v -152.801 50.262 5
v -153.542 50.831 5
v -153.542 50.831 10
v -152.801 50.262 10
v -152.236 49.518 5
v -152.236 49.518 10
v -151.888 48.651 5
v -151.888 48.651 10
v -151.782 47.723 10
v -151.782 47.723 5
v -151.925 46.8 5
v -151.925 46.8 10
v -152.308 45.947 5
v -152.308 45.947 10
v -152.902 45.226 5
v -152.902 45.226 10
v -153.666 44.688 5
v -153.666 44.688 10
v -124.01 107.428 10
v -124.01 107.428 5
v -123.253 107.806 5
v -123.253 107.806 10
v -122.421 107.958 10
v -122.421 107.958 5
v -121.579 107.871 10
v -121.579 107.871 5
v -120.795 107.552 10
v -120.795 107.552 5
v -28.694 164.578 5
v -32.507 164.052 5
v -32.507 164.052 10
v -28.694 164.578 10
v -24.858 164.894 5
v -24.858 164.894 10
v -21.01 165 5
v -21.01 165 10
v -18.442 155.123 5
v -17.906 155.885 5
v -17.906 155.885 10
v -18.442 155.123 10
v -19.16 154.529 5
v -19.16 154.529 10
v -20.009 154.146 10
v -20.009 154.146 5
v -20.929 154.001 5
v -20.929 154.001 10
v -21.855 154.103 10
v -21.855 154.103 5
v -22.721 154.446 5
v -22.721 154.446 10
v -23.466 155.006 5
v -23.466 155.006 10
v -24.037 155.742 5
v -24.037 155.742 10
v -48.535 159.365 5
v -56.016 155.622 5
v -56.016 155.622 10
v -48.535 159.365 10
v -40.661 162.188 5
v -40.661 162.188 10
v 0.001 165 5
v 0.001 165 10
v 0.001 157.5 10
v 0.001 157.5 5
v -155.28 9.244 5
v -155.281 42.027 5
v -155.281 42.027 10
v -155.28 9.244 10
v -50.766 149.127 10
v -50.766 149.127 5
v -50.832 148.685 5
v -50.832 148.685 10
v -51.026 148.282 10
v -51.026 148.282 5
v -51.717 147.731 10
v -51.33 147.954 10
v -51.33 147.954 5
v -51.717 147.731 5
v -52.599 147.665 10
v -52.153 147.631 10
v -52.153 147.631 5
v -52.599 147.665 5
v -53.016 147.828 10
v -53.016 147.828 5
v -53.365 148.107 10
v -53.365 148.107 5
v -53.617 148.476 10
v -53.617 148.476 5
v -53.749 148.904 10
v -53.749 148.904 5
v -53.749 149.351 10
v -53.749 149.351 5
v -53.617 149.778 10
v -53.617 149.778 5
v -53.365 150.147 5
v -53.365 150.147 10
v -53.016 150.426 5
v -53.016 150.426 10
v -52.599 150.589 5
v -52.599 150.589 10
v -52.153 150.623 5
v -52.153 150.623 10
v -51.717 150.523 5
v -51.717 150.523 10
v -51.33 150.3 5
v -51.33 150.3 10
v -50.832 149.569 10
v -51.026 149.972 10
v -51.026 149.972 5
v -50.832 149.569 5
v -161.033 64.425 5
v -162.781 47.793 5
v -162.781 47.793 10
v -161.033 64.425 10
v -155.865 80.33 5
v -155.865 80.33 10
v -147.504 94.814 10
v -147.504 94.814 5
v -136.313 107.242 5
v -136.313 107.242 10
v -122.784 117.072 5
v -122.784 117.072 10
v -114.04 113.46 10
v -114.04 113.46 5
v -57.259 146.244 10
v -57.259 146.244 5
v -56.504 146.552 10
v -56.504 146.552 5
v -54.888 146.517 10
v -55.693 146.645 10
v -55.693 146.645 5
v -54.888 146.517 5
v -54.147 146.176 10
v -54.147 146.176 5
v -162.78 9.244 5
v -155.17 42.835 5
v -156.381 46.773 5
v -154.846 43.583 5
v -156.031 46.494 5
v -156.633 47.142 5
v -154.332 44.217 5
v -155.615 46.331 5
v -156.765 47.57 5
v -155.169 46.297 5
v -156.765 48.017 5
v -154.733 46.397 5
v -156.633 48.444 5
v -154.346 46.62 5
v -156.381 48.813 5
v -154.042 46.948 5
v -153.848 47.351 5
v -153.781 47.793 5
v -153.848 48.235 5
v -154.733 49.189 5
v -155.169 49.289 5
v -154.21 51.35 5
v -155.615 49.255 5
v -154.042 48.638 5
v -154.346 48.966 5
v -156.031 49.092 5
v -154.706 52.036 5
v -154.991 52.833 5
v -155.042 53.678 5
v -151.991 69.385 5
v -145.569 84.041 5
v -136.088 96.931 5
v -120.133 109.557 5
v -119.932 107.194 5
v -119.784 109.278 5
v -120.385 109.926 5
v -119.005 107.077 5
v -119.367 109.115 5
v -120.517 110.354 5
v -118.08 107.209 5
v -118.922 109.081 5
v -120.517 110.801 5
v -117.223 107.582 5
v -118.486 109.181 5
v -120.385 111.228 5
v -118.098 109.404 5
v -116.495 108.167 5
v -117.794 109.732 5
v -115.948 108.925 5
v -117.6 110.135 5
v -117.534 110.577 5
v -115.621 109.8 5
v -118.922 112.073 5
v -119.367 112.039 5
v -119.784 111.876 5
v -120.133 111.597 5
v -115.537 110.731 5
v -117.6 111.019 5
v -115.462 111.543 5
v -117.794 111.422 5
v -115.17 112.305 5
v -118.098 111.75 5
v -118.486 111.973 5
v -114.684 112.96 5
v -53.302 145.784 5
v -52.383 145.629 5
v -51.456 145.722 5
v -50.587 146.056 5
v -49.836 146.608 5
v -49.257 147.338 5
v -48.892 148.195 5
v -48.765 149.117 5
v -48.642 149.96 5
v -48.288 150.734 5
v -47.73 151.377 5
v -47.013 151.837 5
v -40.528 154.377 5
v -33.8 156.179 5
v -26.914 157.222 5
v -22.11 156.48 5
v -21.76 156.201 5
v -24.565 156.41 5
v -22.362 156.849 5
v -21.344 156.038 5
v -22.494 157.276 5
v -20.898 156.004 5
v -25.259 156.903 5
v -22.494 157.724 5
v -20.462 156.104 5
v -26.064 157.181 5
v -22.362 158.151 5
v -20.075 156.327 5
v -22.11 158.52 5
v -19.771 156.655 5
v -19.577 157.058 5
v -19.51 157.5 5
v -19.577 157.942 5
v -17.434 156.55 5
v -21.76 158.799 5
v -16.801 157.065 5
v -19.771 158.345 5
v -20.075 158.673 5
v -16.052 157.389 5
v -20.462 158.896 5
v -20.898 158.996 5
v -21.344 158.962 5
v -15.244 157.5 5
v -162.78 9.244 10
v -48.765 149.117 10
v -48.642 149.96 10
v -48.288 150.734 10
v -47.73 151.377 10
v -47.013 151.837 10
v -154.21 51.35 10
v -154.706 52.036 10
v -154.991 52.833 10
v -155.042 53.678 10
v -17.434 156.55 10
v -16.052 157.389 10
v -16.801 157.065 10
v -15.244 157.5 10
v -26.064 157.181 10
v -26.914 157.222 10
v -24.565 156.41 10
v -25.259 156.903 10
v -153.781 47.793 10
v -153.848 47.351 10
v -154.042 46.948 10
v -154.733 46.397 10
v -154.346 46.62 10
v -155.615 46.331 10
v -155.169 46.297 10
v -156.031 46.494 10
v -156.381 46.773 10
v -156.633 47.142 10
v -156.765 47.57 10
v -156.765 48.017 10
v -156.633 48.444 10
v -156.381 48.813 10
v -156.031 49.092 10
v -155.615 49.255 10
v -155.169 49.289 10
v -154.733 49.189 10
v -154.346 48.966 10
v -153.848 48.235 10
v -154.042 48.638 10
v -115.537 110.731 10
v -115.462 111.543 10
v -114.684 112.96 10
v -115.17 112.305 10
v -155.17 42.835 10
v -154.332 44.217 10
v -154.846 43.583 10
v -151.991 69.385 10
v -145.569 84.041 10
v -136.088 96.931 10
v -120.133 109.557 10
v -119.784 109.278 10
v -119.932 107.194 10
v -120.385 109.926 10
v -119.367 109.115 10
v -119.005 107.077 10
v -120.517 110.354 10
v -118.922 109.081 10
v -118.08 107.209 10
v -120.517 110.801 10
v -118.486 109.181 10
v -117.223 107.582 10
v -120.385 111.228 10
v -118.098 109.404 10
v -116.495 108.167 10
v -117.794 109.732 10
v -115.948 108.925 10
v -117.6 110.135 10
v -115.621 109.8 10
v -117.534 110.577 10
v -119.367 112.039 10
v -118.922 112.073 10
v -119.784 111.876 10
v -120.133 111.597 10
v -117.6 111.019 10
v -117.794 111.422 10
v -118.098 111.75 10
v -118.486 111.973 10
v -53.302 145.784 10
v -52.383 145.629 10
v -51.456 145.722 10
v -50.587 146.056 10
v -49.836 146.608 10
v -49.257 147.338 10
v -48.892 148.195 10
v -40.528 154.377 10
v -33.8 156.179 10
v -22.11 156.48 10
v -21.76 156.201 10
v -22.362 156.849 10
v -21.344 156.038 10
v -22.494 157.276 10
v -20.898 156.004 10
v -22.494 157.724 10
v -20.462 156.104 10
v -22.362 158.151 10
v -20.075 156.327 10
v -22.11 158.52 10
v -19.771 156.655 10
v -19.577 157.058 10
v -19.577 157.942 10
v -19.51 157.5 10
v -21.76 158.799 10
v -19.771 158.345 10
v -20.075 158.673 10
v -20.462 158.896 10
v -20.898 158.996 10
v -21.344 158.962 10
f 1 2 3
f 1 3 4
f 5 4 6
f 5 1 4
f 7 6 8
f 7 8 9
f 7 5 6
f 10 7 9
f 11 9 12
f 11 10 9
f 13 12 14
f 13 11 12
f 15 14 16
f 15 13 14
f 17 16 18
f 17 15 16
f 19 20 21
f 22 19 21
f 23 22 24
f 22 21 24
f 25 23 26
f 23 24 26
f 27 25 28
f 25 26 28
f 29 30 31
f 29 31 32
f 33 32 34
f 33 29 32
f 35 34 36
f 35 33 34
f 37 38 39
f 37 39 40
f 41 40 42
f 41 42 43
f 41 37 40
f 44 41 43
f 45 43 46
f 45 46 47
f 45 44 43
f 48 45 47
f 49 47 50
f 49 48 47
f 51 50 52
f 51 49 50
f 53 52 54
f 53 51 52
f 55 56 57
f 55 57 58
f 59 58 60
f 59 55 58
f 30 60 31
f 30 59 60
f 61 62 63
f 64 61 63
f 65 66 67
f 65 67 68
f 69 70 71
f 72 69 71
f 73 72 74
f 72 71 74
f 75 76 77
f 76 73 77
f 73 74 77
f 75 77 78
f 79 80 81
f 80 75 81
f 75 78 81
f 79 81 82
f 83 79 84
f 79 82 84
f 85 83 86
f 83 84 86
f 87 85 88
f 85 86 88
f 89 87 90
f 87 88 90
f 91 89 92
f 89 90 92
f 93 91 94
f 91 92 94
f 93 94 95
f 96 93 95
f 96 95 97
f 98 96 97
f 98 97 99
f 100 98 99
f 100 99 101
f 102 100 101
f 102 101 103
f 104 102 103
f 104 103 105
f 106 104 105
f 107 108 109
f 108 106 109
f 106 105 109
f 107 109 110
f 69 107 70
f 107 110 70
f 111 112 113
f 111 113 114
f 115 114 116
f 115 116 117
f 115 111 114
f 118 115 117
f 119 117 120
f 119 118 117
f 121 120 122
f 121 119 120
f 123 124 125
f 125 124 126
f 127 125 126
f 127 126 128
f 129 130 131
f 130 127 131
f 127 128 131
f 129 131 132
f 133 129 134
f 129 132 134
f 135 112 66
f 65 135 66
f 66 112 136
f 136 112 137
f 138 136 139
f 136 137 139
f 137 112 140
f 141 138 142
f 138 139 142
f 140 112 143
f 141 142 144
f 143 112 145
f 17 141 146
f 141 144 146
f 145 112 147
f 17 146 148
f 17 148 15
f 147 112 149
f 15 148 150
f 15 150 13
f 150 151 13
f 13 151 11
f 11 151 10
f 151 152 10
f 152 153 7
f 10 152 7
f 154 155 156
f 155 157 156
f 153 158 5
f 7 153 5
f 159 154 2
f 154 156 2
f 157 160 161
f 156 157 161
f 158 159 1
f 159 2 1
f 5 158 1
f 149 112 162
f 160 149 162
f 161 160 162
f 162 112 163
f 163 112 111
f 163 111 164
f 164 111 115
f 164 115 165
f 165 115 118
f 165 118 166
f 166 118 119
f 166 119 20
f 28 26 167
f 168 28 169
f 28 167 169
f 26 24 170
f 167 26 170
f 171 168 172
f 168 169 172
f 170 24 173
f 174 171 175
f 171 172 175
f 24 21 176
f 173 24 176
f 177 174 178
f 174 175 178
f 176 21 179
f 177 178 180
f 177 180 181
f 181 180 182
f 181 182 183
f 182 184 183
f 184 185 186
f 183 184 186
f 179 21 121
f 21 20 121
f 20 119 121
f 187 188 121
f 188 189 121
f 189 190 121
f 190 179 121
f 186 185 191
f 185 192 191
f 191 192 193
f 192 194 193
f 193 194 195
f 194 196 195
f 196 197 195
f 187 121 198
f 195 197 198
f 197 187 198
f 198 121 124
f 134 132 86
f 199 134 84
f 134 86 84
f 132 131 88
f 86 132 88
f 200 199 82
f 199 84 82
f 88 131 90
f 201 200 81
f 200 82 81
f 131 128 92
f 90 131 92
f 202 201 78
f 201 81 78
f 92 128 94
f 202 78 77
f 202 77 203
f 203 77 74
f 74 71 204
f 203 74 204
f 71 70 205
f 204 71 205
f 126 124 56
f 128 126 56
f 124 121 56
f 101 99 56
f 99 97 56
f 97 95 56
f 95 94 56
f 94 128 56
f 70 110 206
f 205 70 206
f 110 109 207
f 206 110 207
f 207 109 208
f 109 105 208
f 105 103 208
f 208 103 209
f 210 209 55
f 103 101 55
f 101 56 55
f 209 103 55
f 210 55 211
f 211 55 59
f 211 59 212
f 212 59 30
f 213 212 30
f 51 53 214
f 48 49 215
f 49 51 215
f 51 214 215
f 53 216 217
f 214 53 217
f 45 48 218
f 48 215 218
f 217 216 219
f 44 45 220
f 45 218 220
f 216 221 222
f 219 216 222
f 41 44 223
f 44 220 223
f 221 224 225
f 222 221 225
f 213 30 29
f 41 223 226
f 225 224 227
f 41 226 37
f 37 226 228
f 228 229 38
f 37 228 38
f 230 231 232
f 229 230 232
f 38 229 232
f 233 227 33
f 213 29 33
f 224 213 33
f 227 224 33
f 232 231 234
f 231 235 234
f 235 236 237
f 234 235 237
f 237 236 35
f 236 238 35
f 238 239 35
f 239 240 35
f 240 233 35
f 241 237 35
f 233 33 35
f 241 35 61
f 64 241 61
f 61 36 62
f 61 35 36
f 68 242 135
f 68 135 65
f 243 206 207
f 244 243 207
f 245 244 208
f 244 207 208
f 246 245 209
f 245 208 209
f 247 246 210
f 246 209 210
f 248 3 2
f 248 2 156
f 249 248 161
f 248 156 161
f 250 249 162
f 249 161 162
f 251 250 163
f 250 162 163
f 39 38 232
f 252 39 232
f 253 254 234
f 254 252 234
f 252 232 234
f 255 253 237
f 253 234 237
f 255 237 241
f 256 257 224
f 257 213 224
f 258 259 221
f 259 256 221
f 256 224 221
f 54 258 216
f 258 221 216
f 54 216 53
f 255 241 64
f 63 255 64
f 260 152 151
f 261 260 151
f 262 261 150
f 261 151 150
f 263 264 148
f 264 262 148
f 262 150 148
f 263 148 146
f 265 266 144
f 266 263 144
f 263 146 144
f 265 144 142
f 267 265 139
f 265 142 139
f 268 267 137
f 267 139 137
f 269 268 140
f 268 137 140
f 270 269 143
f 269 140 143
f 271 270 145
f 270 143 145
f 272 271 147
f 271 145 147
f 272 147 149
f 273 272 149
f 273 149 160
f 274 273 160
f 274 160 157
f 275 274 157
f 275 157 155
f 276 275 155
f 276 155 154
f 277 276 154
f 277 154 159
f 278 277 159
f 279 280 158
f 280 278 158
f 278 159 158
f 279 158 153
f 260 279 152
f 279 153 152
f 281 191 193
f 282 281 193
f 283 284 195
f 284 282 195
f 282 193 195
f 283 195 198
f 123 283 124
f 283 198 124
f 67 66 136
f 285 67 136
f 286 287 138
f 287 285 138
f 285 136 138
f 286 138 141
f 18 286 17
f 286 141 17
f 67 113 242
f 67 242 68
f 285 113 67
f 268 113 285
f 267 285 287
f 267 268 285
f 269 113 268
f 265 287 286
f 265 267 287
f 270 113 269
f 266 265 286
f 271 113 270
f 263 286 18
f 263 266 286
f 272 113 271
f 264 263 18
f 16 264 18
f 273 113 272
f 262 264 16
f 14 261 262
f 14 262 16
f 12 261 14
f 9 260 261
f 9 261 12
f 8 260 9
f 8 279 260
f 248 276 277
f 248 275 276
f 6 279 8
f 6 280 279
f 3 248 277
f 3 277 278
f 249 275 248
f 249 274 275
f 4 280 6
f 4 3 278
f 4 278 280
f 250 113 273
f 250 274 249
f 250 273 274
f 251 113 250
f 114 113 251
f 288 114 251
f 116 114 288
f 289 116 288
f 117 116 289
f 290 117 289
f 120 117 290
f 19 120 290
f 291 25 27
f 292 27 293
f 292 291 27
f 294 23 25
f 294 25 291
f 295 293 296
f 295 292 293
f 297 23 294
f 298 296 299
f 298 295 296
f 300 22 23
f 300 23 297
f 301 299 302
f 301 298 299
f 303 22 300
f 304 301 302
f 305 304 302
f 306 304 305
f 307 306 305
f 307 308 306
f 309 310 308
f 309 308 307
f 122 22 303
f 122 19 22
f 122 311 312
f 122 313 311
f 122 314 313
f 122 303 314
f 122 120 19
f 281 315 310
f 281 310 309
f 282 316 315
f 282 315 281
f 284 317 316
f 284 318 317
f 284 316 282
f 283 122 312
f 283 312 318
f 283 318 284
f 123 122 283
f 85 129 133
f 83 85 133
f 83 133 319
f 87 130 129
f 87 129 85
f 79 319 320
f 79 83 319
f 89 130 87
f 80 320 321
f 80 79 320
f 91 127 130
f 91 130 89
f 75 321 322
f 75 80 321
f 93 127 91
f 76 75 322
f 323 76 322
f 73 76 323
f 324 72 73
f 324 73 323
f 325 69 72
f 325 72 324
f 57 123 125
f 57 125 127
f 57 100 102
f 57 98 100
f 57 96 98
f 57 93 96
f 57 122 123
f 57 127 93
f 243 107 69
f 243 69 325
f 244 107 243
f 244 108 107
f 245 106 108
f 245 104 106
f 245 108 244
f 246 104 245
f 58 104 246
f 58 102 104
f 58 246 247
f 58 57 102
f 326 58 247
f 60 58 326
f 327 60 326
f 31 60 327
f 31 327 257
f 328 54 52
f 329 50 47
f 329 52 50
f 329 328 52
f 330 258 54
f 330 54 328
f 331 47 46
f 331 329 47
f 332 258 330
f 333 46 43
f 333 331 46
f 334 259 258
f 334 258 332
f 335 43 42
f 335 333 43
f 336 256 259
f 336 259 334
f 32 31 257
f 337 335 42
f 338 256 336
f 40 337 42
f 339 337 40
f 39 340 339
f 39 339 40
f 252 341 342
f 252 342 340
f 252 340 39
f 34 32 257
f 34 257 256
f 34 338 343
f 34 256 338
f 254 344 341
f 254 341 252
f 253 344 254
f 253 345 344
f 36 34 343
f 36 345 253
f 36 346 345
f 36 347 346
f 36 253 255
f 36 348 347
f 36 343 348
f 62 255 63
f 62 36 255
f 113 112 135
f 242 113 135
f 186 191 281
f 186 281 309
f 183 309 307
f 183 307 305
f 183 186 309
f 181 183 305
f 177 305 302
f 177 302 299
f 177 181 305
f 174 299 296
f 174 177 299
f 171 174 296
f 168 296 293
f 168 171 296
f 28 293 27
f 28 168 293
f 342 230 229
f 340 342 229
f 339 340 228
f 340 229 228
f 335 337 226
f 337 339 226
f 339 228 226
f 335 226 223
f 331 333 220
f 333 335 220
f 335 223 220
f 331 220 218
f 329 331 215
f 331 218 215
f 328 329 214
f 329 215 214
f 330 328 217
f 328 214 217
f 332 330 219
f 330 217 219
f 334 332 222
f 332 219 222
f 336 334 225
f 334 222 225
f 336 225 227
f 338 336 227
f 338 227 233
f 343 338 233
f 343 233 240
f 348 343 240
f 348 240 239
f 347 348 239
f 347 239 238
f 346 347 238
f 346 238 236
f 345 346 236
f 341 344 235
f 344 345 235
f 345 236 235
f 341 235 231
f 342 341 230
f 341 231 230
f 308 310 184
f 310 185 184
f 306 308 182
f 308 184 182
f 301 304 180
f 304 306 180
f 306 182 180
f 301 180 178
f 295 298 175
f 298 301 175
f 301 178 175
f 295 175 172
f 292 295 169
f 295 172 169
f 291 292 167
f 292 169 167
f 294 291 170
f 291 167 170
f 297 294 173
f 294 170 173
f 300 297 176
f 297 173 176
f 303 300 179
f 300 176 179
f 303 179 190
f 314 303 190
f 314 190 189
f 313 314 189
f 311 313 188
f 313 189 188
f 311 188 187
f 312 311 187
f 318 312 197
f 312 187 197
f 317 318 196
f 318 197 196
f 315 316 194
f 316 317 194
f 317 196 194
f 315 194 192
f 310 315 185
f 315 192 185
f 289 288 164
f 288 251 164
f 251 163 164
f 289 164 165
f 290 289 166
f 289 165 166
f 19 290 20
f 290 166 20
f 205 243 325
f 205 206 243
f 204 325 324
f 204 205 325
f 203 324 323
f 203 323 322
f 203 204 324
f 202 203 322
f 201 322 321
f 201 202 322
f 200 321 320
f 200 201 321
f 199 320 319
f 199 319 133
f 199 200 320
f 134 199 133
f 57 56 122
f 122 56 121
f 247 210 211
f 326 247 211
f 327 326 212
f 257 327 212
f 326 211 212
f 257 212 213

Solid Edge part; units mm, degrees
sketch "Sketch1" plane through (0.0007, 14.651, 5) normal (0, 0, 1) x (1, 0, 0)
  line L0 (-114.0407, 98.8093) -> (-57.2599, 131.5929)
  arc A0 (-54.1474, 131.5247) -> (-57.2599, 131.5929) centre (-55.7598, 128.9948) ccw
  arc A1 (-47.0142, 137.1861) -> (-48.7662, 134.4664) centre (-45.7662, 134.458) ccw
  arc A2 (-47.0142, 137.1861) -> (-26.9146, 142.5706) centre (-21.0226, 80.3698) cw
  arc A3 (-24.0376, 141.0909) -> (-26.9146, 142.5706) centre (-26.6317, 139.5839) ccw
  arc A4 (-15.245, 142.849) -> (-17.9063, 141.2336) centre (-15.245, 139.849) ccw
  line L1 (-15.245, 142.849) -> (15.2436, 142.849)
  arc A5 (17.905, 141.2336) -> (15.2436, 142.849) centre (15.2436, 139.849) ccw
  arc A6 (26.9132, 142.5696) -> (24.036, 141.0904) centre (26.6298, 139.583) ccw
  arc A7 (26.9132, 142.5696) -> (47.0027, 137.1869) centre (21.0099, 80.3561) cw
  arc A8 (48.7549, 134.4673) -> (47.0027, 137.1869) centre (45.7549, 134.4587) ccw
  arc A9 (57.2487, 131.5943) -> (54.1362, 131.526) centre (55.7487, 128.9962) ccw
  line L2 (57.2487, 131.5943) -> (114.0299, 98.8129)
  arc A10 (115.5271, 96.0833) -> (114.0299, 98.8129) centre (112.5299, 96.2148) ccw
  arc A11 (124.0003, 92.7805) -> (120.7849, 92.9052) centre (122.2944, 90.3127) ccw
  arc A12 (124.0003, 92.7805) -> (155.0355, 39.027) centre (82.7747, 33.1424) cw
  arc A13 (153.5358, 36.1799) -> (155.0355, 39.027) centre (152.0454, 38.7835) ccw
  arc A14 (155.2747, 27.3761) -> (153.6593, 30.0375) centre (152.2747, 27.3761) ccw
  line L3 (155.2747, 27.3761) -> (155.2747, -38.192)
  arc A15 (153.6593, -40.8534) -> (155.2747, -38.192) centre (152.2747, -38.192) ccw
  arc A16 (154.9954, -49.8615) -> (153.5161, -46.9844) centre (152.0088, -49.5782) ccw
  arc A17 (154.9954, -49.8615) -> (149.6134, -69.9554) centre (92.7533, -43.9583) cw
  arc A18 (146.8942, -71.7079) -> (149.6134, -69.9554) centre (146.8851, -68.7079) ccw
  arc A19 (144.0217, -80.2016) -> (143.9534, -77.0892) centre (141.4236, -78.7016) ccw
  line L4 (144.0217, -80.2016) -> (127.6444, -108.5679)
  arc A20 (122.7007, -116.5716) -> (122.8583, -113.3403) centre (120.256, -114.8329) ccw
  arc A21 (77.6703, -142.5696) -> (122.7007, -116.5716) centre (71.767, -80.3476) ccw
  arc A22 (74.7931, -141.0904) -> (77.6703, -142.5696) centre (77.3869, -139.583) ccw
  arc A23 (66.0007, -142.849) -> (68.6621, -141.2336) centre (66.0007, -139.849) ccw
  line L5 (5.7656, -142.849) -> (66.0007, -142.849)
  arc A24 (3.1042, -141.2336) -> (5.7656, -142.849) centre (5.7656, -139.849) ccw
  arc A25 (-5.767, -142.849) -> (-3.1056, -141.2336) centre (-5.767, -139.849) ccw
  line L6 (-66.0021, -142.849) -> (-5.767, -142.849)
  arc A26 (-68.6634, -141.2336) -> (-66.0021, -142.849) centre (-66.0021, -139.849) ccw
  arc A27 (-77.6716, -142.5694) -> (-74.7944, -141.0903) centre (-77.3881, -139.5828) ccw
  arc A28 (-122.6994, -116.5717) -> (-77.6716, -142.5694) centre (-71.7665, -80.349) ccw
  arc A29 (-122.857, -113.3404) -> (-122.6994, -116.5717) centre (-120.2547, -114.833) ccw
  arc A30 (-128.7762, -106.6053) -> (-126.0465, -108.1024) centre (-126.1781, -105.1053) ccw
  line L7 (-144.0218, -80.199) -> (-128.7762, -106.6053)
  arc A31 (-143.9535, -77.0865) -> (-144.0218, -80.199) centre (-141.4237, -78.699) ccw
  arc A32 (-149.6144, -69.9531) -> (-146.8949, -71.7053) centre (-146.8862, -68.7053) ccw
  arc A33 (-154.9987, -49.8585) -> (-149.6144, -69.9531) centre (-92.7672, -43.9523) ccw
  arc A34 (-153.5196, -46.9813) -> (-154.9987, -49.8585) centre (-152.0122, -49.5751) ccw
  arc A35 (-155.2786, -38.189) -> (-153.6631, -40.8503) centre (-152.2786, -38.1889) ccw
  line L8 (-155.2818, 27.3758) -> (-155.2786, -38.189)
  arc A36 (-153.6665, 30.0373) -> (-155.2818, 27.3758) centre (-152.2818, 27.376) ccw
  arc A37 (-155.0428, 39.0267) -> (-153.5432, 36.1796) centre (-152.0527, 38.7832) ccw
  arc A38 (-124.0109, 92.7765) -> (-155.0428, 39.0267) centre (-82.7847, 33.1421) ccw
  arc A39 (-120.7955, 92.9014) -> (-124.0109, 92.7765) centre (-122.3049, 90.3088) ccw
  arc A40 (-114.0407, 98.8093) -> (-115.5378, 96.0796) centre (-112.5406, 96.2112) ccw
  arc A41 (-48.7662, 134.4664) -> (-54.1474, 131.5247) centre (-52.2662, 134.4761) cw
  arc A42 (-17.9064, 141.2336) -> (-24.0377, 141.0909) centre (-21.0113, 142.849) cw
  arc A43 (24.036, 141.0904) -> (17.905, 141.2336) centre (21.0099, 142.849) cw
  arc A44 (54.1362, 131.526) -> (48.7549, 134.4673) centre (52.2549, 134.4774) cw
  arc A45 (120.7849, 92.9052) -> (115.5271, 96.0832) centre (119.0237, 95.9298) cw
  arc A46 (153.6593, 30.0375) -> (153.5358, 36.1799) centre (155.2747, 33.1424) cw
  arc A47 (153.5161, -46.9844) -> (153.6593, -40.8534) centre (155.2747, -43.9583) cw
  arc A48 (143.9534, -77.0891) -> (146.8942, -71.7079) centre (146.9048, -75.2079) cw
  arc A49 (122.8584, -113.3404) -> (127.6444, -108.5679) centre (125.8944, -111.599) cw
  arc A50 (68.6621, -141.2336) -> (74.7931, -141.0904) centre (71.767, -142.849) cw
  arc A51 (-3.1056, -141.2336) -> (3.1042, -141.2336) centre (-0.0007, -142.849) cw
  arc A52 (-74.7944, -141.0903) -> (-68.6635, -141.2336) centre (-71.7684, -142.849) cw
  arc A53 (-126.0466, -108.1024) -> (-122.857, -113.3404) centre (-125.8931, -111.599) cw
  arc A54 (-146.8949, -71.7053) -> (-143.9536, -77.0866) centre (-146.905, -75.2053) cw
  arc A55 (-153.6632, -40.8503) -> (-153.5196, -46.9813) centre (-155.2784, -43.9553) cw
  arc A56 (-153.5432, 36.1796) -> (-153.6665, 30.0373) centre (-155.2821, 33.1421) cw
  arc A57 (-115.5377, 96.0796) -> (-120.7955, 92.9014) centre (-119.0344, 95.926) cw
  line L9 (-56.0166, 140.971) -> (-122.7845, 102.4212)
  arc A58 (-162.7821, 33.1421) -> (-122.7845, 102.4212) centre (-82.7847, 33.1421) cw
  line L10 (-162.7821, 33.1421) -> (-162.7784, -43.9553)
  arc A59 (-162.7784, -43.9553) -> (-153.4002, -78.9553) centre (-92.7784, -43.9553) ccw
  line L11 (-132.3882, -115.349) -> (-153.4002, -78.9553)
  arc A60 (-132.3882, -115.349) -> (-71.7683, -150.349) centre (-71.7665, -80.349) ccw
  line L12 (71.767, -150.349) -> (-71.7683, -150.349)
  arc A61 (71.767, -150.349) -> (132.3896, -115.349) centre (71.7678, -80.349) ccw
  line L13 (132.3896, -115.349) -> (153.4002, -78.9576)
  arc A62 (162.7747, -43.9583) -> (153.4002, -78.9576) centre (92.791, -43.9684) cw
  line L14 (162.7747, 33.1424) -> (162.7747, -43.9583)
  arc A63 (122.7736, 102.4251) -> (162.7747, 33.1424) centre (82.7747, 33.1424) cw
  line L15 (56.0045, 140.9728) -> (122.7736, 102.4251)
  arc A64 (21.0099, 150.349) -> (56.0045, 140.9728) centre (21.008, 80.349) cw
  line L16 (-21.0112, 150.349) -> (21.0099, 150.349)
  arc A65 (-32.5074, 149.4015) -> (-21.0112, 150.349) centre (-20.997, 79.961) cw
  arc A66 (-44.641, 146.2432) -> (-32.5074, 149.4015) centre (-21.0122, 80.3518) cw
  arc A67 (-56.0166, 140.971) -> (-44.641, 146.2432) centre (-21.0122, 80.3518) cw
  circle A68 centre (-71.7683, -142.849) radius 1.5
  circle A69 centre (-0.0007, -142.849) radius 1.5
  circle A70 centre (-125.893, -111.599) radius 1.5
  circle A71 centre (-146.905, -75.2053) radius 1.5
  circle A72 centre (-155.2784, -43.9553) radius 1.5
  circle A73 centre (-155.2821, 33.1421) radius 1.5
  circle A74 centre (-119.0344, 95.9261) radius 1.5
  circle A75 centre (-52.2662, 134.4761) radius 1.5
  circle A76 centre (-21.0112, 142.849) radius 1.5
  circle A77 centre (21.0099, 142.849) radius 1.5
  circle A78 centre (52.2549, 134.4774) radius 1.5
  circle A79 centre (119.0237, 95.9298) radius 1.5
  circle A80 centre (155.2747, 33.1424) radius 1.5
  circle A81 centre (155.2747, -43.9583) radius 1.5
  circle A82 centre (146.9048, -75.2079) radius 1.5
  circle A83 centre (125.8944, -111.599) radius 1.5
  circle A84 centre (71.767, -142.849) radius 1.5
extrude "ExtrudedProtrusion_7" add sketch "Sketch1" along normal blind 5
sketch "Sketch2" plane through (-0.003, 14.651, 10) normal (0, 0, 1) x (1, 0, 0)
  line L0 (-170.0115, -5.4066) -> (169.0999, -5.4066)
  line L1 (169.0999, -5.4066) -> (169.0999, -159.984)
  line L2 (169.0999, -159.984) -> (-170.0115, -159.984)
  line L3 (-170.0115, -159.984) -> (-170.0115, -5.4066)
extrude "Cutout1" cut sketch "Sketch2" against normal up to next
sketch "Sketch3" plane through (-0.003, 87.1222, 10) normal (0, 0, 1) x (0.866, -0.5, 0)
  line L0 (-38.9352, 67.4463) -> (43.5625, -75.4492)
  line L1 (43.5625, -75.4492) -> (205.1735, 17.8535)
  line L2 (205.1735, 17.8535) -> (122.2113, 161.5535)
  line L3 (122.2113, 161.5535) -> (-38.8416, 68.573)
  line L4 (-38.9352, 67.4463) -> (-38.8416, 68.573)
extrude "Cutout2" cut sketch "Sketch3" against normal up to next
properties material "Polycarbonate"
